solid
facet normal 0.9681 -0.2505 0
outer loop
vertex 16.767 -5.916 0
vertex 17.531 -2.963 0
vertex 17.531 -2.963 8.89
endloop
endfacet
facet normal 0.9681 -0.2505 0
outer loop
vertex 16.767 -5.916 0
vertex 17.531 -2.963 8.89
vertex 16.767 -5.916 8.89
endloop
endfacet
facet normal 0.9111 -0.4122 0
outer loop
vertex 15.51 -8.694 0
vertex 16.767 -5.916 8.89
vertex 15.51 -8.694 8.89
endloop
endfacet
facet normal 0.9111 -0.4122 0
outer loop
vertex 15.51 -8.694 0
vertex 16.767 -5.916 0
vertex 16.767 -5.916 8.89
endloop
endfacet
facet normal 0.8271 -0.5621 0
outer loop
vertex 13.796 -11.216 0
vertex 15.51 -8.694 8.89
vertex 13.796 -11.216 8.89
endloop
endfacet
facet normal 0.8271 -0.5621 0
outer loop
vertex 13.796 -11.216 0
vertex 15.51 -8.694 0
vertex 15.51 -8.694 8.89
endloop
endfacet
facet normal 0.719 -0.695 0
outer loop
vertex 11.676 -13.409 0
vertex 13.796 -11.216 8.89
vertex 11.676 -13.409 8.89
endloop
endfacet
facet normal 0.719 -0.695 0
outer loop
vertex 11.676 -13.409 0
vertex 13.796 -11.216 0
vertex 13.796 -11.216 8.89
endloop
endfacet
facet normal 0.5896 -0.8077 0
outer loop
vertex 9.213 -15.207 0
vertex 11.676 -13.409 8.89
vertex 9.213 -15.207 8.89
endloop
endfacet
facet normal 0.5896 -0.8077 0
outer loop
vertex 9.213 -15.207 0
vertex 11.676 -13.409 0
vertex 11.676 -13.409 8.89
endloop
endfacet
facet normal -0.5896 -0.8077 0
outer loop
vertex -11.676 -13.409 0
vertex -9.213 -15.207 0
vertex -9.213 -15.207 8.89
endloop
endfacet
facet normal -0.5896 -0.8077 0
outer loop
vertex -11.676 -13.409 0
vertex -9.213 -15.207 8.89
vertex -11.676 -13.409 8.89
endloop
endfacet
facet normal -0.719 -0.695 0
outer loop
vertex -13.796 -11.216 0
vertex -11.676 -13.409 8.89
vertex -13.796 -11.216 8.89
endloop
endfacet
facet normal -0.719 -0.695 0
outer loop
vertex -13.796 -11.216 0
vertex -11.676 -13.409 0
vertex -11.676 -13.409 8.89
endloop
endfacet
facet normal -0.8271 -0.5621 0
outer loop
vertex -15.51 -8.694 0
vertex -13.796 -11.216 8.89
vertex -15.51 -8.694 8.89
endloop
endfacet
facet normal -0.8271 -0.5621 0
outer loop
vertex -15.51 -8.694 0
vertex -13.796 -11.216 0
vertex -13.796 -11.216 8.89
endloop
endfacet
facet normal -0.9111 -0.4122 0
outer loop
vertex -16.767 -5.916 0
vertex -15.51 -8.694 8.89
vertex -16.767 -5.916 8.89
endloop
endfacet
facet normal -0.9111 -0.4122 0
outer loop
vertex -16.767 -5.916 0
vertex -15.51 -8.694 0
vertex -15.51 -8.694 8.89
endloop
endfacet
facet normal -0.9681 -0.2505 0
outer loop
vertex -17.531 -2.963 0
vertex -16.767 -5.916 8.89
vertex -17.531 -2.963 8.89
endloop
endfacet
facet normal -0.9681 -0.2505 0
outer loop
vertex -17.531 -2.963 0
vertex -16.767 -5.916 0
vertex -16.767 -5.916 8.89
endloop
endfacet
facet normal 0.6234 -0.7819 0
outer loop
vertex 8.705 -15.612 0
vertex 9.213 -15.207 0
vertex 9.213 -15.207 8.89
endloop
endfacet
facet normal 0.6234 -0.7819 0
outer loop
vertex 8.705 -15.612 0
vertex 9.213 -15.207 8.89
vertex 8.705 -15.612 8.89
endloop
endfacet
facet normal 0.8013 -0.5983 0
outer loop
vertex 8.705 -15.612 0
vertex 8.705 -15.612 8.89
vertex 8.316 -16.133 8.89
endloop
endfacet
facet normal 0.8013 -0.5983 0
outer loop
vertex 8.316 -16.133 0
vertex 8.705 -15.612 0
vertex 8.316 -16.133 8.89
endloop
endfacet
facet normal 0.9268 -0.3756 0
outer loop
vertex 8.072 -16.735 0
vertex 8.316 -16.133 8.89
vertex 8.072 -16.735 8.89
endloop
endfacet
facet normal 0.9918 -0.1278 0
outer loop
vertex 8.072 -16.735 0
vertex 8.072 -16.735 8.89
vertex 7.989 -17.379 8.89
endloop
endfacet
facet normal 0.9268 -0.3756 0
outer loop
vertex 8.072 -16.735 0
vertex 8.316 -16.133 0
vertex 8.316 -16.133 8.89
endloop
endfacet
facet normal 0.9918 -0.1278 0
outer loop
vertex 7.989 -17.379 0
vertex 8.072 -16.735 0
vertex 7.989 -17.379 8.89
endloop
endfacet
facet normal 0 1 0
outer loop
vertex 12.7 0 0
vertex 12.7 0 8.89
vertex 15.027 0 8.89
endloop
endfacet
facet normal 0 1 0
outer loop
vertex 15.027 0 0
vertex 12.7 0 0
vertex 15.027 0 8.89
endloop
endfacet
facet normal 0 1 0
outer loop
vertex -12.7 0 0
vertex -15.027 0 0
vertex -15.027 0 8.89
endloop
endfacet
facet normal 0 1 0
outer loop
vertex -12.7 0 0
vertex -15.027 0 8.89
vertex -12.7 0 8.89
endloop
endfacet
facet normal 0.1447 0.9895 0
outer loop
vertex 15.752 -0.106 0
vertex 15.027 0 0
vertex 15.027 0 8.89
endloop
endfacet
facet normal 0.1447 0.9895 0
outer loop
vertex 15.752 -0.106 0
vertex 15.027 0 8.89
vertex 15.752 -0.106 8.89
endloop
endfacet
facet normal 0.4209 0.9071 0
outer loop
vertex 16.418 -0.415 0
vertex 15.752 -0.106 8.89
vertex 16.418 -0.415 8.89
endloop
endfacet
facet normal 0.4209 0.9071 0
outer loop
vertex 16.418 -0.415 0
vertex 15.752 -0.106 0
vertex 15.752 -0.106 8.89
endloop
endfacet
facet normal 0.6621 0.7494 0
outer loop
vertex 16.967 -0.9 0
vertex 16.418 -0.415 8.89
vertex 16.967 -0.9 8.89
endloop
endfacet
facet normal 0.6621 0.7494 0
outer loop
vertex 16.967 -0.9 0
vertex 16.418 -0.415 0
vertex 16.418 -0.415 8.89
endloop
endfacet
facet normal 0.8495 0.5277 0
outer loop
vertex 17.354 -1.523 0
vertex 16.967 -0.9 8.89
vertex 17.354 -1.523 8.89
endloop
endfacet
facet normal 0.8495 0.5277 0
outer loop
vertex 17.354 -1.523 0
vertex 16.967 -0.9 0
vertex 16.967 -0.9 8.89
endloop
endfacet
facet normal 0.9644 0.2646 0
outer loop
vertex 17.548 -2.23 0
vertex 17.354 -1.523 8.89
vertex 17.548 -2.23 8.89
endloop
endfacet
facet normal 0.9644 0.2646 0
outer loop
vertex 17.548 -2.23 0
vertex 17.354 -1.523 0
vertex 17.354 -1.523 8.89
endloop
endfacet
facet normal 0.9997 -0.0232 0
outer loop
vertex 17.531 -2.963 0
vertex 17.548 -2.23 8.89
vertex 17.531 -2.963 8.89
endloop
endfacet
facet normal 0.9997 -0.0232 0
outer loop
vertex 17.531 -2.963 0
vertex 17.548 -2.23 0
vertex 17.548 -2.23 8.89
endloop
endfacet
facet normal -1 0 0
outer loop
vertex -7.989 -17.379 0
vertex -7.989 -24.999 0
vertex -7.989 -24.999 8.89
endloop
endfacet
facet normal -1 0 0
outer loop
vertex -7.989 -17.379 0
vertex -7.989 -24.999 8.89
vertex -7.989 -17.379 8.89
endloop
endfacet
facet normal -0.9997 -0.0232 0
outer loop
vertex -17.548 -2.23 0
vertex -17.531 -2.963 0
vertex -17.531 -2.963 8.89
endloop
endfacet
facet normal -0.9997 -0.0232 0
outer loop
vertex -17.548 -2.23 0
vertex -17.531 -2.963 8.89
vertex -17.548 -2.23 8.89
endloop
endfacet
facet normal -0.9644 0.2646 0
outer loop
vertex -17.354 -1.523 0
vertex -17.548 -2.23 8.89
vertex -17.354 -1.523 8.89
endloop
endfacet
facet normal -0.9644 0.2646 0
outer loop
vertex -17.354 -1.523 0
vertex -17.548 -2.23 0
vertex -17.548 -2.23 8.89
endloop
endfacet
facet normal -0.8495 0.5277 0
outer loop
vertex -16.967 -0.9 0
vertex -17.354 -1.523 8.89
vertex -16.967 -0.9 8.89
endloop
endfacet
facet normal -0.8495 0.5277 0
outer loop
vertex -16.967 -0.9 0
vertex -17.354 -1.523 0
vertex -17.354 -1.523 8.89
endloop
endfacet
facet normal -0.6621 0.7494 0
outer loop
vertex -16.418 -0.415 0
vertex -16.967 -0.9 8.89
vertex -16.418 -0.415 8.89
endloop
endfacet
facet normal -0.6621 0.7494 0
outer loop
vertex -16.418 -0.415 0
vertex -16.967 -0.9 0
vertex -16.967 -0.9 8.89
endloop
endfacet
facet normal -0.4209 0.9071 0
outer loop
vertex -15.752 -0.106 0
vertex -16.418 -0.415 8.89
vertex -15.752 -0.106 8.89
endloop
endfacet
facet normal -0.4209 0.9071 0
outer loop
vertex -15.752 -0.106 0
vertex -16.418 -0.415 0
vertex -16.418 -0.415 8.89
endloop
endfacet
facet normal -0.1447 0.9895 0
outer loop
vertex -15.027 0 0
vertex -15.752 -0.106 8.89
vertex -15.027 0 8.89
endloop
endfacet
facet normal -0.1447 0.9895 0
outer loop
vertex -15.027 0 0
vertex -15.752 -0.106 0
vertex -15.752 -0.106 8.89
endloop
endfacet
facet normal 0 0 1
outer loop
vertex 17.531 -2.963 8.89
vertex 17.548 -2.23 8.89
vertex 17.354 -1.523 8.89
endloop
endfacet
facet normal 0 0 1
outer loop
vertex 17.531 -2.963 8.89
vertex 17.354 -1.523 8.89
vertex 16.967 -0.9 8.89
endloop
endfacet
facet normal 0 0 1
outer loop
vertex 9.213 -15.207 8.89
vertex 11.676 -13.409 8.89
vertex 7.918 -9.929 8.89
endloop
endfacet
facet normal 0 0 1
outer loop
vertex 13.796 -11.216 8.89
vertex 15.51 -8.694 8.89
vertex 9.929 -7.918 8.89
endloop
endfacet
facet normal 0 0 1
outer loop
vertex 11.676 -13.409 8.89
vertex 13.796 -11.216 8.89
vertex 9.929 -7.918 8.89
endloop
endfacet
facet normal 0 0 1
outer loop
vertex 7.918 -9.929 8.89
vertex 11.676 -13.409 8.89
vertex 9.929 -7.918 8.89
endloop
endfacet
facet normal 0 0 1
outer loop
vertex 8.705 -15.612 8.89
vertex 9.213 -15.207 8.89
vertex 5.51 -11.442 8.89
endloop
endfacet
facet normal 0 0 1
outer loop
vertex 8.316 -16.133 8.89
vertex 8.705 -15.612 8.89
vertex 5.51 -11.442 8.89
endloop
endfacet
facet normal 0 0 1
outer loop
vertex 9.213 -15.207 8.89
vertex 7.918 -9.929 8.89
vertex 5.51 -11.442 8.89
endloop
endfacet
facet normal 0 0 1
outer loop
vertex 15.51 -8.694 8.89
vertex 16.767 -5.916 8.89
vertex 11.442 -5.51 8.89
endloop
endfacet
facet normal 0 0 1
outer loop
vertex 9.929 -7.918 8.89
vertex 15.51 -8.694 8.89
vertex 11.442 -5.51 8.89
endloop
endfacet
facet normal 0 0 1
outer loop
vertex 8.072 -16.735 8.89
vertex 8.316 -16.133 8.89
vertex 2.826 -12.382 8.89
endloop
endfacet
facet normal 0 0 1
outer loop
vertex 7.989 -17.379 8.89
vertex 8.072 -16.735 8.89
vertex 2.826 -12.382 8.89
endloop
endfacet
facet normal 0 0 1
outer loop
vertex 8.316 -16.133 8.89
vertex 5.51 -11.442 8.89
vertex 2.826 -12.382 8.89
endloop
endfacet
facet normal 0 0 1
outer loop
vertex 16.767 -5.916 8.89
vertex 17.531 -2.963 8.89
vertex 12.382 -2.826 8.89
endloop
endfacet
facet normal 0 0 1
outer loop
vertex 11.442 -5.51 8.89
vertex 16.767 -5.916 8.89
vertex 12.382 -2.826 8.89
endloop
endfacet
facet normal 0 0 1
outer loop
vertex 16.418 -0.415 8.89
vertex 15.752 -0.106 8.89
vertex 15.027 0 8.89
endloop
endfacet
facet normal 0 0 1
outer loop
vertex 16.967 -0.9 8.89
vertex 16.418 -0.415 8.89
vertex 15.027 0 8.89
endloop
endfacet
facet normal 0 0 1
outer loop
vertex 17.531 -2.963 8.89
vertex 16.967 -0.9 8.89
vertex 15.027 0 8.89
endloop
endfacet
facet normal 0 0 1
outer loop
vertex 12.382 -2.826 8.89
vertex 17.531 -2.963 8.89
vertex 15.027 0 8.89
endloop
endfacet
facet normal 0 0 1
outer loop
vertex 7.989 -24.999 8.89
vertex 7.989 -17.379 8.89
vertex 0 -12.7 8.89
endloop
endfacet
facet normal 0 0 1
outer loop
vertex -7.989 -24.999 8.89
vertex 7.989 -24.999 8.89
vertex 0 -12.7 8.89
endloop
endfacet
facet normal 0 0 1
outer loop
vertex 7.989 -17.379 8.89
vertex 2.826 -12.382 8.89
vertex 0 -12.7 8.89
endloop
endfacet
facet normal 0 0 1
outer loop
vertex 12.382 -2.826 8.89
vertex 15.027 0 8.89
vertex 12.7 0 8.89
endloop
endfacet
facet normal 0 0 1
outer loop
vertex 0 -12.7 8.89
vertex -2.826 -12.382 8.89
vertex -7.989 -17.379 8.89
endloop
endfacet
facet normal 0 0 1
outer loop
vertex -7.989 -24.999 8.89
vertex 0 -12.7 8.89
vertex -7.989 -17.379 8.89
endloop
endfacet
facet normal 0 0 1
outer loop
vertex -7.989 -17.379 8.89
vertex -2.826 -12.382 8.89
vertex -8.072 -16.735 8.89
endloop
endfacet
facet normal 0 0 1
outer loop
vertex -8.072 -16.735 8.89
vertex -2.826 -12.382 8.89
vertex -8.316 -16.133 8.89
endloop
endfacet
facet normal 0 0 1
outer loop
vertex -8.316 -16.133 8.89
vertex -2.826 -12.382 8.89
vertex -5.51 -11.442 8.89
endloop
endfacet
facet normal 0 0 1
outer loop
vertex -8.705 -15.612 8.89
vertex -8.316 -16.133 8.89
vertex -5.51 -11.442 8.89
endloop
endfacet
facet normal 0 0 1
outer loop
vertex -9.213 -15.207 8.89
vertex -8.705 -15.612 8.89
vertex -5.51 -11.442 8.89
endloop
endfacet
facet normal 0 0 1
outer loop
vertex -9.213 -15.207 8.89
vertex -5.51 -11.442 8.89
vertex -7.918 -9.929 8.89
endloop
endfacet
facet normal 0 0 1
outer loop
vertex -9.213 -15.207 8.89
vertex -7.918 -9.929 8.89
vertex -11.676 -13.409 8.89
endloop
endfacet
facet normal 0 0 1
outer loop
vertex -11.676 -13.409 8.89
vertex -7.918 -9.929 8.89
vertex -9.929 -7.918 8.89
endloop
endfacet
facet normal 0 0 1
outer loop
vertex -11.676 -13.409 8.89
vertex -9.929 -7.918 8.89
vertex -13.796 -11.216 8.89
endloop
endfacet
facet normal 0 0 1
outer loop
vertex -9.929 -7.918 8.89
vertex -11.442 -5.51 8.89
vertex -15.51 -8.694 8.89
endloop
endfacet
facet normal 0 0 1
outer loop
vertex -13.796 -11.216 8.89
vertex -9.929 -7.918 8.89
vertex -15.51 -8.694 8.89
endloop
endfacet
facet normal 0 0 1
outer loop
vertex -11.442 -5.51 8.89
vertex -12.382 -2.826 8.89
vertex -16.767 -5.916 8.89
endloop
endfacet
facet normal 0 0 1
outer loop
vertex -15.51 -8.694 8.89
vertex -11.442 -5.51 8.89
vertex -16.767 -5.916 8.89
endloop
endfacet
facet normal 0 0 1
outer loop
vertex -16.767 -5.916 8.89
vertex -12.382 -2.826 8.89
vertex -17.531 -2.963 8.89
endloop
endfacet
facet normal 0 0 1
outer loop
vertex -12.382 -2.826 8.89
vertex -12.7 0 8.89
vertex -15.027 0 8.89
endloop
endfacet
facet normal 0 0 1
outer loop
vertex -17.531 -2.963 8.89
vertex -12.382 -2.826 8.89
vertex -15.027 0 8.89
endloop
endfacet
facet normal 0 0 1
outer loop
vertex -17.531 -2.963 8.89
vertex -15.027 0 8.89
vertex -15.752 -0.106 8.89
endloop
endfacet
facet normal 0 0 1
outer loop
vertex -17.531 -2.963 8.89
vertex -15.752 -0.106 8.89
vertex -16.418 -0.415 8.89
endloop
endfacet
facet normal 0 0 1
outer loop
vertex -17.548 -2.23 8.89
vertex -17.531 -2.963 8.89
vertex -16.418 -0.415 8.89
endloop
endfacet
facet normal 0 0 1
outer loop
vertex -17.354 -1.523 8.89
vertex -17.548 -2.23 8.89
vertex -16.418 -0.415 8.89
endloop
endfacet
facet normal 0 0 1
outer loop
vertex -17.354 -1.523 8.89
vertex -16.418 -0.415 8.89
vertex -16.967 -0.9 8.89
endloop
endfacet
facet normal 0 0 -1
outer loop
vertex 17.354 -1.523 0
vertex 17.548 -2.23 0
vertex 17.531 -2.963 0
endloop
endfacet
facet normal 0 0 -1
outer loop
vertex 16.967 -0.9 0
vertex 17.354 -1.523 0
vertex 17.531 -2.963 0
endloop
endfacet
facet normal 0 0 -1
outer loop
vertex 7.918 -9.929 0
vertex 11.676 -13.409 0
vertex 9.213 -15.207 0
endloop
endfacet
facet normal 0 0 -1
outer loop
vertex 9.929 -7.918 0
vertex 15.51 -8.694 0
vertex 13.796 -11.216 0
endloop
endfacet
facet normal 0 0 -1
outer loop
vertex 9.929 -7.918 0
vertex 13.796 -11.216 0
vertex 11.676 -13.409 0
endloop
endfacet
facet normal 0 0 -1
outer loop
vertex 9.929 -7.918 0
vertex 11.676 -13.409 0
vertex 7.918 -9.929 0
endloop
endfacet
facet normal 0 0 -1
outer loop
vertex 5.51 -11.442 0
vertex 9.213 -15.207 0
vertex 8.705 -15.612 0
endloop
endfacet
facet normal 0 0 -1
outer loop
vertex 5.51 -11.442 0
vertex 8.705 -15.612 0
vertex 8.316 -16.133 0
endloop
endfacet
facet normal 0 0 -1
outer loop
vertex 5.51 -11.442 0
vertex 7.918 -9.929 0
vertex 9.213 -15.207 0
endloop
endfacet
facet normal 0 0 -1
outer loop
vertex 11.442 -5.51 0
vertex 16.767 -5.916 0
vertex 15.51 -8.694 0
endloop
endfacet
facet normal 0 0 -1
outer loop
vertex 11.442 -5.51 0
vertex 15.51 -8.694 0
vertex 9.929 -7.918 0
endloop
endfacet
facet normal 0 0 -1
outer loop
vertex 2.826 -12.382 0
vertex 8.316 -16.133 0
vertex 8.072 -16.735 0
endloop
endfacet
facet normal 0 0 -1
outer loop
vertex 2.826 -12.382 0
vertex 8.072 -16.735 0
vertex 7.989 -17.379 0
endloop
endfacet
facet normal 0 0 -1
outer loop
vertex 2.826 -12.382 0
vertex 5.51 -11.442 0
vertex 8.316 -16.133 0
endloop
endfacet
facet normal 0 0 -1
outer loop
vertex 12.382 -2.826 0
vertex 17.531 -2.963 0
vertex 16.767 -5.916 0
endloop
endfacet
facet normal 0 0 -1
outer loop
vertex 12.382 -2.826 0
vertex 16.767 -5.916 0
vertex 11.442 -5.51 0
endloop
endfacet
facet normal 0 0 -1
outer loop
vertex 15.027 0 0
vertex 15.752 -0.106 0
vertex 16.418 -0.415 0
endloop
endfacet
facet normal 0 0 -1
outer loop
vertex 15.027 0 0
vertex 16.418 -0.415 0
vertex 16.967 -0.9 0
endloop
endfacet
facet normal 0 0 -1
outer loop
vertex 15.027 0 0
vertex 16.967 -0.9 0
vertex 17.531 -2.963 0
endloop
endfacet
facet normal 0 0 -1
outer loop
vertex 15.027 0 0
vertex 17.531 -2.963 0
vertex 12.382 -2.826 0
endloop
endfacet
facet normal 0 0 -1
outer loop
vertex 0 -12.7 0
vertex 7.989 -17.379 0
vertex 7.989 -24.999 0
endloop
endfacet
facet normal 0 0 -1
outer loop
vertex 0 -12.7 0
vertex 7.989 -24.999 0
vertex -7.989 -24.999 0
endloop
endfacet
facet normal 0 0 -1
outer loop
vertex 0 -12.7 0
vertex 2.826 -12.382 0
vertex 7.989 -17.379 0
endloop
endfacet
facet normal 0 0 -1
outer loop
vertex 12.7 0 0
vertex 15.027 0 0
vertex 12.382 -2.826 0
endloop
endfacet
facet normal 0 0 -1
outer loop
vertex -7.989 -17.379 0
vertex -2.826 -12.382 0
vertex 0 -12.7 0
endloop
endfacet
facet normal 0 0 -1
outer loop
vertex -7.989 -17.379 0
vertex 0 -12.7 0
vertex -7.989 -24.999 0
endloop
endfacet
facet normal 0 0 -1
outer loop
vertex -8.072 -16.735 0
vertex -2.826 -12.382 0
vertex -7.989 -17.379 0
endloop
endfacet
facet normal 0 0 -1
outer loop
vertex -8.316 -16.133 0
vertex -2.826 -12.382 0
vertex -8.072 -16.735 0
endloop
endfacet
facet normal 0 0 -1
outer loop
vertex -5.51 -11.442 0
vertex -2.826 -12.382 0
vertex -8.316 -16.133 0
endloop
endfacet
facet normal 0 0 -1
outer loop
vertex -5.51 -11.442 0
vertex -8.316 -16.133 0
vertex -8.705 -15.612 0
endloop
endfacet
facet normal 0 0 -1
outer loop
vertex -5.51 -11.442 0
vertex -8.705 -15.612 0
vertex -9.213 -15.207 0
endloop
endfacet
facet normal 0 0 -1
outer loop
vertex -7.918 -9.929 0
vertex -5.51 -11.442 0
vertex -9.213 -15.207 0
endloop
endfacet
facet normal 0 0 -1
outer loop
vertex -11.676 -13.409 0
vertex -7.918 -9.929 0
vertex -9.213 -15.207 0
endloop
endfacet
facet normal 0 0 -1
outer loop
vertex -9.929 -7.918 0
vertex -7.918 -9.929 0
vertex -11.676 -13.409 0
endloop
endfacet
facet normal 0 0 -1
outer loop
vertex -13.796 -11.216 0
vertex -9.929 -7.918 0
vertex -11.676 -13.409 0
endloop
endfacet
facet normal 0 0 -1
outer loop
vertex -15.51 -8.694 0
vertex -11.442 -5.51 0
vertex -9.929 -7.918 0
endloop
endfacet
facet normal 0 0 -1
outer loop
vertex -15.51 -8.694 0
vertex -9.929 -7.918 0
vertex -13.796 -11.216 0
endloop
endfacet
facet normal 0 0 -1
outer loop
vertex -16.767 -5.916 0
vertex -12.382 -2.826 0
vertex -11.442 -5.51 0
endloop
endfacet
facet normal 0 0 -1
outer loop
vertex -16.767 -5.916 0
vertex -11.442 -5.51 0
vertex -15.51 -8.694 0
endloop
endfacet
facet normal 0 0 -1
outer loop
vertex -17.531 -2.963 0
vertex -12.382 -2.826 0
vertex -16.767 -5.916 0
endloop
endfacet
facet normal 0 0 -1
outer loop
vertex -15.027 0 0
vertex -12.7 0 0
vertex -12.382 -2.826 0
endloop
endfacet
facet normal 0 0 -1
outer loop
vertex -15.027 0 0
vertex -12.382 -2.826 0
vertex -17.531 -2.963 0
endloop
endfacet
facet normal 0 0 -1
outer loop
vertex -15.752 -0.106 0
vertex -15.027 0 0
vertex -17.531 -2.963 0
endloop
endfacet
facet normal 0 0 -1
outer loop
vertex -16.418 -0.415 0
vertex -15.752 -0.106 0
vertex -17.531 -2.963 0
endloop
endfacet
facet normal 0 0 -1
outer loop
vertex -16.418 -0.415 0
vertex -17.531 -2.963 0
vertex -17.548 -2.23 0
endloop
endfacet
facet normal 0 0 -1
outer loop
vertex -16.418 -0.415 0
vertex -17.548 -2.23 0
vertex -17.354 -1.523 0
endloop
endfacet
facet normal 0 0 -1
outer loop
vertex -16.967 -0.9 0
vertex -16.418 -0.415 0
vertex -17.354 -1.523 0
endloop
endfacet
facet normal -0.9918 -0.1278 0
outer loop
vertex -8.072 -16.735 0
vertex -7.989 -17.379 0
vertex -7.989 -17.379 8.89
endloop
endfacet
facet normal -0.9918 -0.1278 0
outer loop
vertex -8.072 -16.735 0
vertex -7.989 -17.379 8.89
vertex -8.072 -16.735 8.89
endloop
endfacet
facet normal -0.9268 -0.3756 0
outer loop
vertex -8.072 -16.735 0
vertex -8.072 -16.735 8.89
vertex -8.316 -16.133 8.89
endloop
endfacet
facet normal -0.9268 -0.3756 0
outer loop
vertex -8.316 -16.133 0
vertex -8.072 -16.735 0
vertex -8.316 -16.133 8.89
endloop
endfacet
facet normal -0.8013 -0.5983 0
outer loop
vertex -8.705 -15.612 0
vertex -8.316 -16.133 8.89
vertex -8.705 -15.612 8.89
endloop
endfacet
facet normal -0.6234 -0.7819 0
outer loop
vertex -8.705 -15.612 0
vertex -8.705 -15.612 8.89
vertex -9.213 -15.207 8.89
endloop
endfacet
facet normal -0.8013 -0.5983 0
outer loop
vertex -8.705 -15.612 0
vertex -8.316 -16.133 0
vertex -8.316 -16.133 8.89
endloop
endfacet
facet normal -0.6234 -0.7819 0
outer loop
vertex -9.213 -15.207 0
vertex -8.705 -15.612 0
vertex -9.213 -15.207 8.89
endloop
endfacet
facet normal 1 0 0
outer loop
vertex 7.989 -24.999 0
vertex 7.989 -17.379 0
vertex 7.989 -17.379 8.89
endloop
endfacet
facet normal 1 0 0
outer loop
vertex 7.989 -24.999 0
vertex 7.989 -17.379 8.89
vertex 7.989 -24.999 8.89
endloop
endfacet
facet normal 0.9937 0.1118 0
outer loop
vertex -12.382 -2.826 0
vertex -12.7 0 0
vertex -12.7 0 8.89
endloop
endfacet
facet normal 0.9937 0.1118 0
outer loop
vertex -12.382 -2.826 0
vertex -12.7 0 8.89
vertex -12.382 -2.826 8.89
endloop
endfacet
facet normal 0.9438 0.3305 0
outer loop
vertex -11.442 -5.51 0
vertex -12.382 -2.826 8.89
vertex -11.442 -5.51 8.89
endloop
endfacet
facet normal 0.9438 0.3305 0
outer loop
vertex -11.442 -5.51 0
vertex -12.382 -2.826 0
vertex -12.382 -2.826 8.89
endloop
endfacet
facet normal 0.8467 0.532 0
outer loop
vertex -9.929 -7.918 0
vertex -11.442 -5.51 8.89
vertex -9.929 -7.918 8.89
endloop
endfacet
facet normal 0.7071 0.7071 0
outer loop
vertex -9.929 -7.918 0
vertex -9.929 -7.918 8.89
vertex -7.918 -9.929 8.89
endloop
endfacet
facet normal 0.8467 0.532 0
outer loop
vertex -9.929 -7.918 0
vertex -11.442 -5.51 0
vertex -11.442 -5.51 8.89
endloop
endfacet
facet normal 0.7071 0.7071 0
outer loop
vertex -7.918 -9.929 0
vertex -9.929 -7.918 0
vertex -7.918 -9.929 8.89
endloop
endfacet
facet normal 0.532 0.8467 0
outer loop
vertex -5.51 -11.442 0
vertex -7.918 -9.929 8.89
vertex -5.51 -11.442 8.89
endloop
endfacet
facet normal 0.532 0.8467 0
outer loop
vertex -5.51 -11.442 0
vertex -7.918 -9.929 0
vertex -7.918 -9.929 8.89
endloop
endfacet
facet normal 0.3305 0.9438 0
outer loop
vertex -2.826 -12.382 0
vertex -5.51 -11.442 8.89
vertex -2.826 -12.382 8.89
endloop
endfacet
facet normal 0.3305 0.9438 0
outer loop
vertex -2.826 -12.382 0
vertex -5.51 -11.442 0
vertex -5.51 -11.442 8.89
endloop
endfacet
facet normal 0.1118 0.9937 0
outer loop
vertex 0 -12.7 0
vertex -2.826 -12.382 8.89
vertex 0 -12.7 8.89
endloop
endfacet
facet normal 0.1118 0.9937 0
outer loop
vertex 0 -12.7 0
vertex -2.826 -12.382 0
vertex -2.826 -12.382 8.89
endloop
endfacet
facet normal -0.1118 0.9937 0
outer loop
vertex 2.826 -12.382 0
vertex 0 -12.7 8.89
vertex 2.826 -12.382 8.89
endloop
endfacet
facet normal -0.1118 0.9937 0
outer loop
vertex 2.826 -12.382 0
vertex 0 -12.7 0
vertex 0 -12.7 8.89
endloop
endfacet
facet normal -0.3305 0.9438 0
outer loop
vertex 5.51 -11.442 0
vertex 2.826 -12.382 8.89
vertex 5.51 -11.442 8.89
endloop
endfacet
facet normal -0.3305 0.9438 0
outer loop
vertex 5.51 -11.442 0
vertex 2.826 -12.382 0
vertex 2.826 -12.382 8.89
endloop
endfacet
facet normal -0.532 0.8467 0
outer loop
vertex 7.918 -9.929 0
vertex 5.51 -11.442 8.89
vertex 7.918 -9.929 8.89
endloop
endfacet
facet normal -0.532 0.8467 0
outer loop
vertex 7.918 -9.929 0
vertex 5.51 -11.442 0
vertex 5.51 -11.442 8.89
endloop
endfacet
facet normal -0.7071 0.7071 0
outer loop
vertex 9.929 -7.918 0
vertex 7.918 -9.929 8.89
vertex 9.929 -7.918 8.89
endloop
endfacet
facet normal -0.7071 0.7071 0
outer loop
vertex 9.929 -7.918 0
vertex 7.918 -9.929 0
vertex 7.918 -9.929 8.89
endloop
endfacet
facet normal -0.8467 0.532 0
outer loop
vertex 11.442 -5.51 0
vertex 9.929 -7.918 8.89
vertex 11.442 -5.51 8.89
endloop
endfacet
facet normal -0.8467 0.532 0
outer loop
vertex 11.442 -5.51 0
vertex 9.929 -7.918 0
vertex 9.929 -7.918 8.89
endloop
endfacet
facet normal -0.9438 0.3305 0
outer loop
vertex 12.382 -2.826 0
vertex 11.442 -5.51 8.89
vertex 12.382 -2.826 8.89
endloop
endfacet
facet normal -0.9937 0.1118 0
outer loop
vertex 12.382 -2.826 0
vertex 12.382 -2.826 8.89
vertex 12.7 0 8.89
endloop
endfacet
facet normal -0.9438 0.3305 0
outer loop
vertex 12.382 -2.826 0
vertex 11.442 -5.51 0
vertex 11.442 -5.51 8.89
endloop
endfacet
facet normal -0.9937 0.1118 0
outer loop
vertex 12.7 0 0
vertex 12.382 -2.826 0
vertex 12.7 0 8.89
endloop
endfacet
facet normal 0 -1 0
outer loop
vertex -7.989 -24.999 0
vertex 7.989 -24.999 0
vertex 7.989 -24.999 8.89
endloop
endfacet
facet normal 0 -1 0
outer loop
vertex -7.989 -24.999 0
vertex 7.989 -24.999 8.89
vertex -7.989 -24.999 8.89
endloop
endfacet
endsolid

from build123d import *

# Parameters (mm, degrees)
EXTRUDE_1_DEPTH = 8.89


with BuildPart() as part:
    # 草图1 → 凸台-拉伸1 (new body)
    with BuildSketch(Plane.XY):
        with BuildLine():
            Line((-15.026842649, 0), (-12.7, 0))
            ThreePointArc((-12.7, 0), (0, -12.7), (12.7, 0))
            Line((12.7, 0), (15.026842649, 0))
            ThreePointArc((15.026842649, 0), (16.966799693, -0.90043705), (17.531316424, -2.963333333))
            ThreePointArc((17.531316424, -2.963333333), (14.706844565, -9.991852829), (9.213060739, -15.206837667))
            ThreePointArc((9.213060739, -15.206837667), (8.316225051, -16.132532355), (7.989212273, -17.379243047))
            Line((7.989212273, -17.379243047), (7.989212273, -24.999243047))
            Line((7.989212273, -24.999243047), (-7.989212273, -24.999243047))
            Line((-7.989212273, -24.999243047), (-7.989212273, -17.379243047))
            ThreePointArc((-7.989212273, -17.379243047), (-8.316225051, -16.132532355), (-9.213060739, -15.206837667))
            ThreePointArc((-9.213060739, -15.206837667), (-14.706844565, -9.991852829), (-17.531316424, -2.963333333))
            ThreePointArc((-17.531316424, -2.963333333), (-16.966799693, -0.90043705), (-15.026842649, 0))
        make_face()
    extrude(amount=EXTRUDE_1_DEPTH)


solid = part.part
